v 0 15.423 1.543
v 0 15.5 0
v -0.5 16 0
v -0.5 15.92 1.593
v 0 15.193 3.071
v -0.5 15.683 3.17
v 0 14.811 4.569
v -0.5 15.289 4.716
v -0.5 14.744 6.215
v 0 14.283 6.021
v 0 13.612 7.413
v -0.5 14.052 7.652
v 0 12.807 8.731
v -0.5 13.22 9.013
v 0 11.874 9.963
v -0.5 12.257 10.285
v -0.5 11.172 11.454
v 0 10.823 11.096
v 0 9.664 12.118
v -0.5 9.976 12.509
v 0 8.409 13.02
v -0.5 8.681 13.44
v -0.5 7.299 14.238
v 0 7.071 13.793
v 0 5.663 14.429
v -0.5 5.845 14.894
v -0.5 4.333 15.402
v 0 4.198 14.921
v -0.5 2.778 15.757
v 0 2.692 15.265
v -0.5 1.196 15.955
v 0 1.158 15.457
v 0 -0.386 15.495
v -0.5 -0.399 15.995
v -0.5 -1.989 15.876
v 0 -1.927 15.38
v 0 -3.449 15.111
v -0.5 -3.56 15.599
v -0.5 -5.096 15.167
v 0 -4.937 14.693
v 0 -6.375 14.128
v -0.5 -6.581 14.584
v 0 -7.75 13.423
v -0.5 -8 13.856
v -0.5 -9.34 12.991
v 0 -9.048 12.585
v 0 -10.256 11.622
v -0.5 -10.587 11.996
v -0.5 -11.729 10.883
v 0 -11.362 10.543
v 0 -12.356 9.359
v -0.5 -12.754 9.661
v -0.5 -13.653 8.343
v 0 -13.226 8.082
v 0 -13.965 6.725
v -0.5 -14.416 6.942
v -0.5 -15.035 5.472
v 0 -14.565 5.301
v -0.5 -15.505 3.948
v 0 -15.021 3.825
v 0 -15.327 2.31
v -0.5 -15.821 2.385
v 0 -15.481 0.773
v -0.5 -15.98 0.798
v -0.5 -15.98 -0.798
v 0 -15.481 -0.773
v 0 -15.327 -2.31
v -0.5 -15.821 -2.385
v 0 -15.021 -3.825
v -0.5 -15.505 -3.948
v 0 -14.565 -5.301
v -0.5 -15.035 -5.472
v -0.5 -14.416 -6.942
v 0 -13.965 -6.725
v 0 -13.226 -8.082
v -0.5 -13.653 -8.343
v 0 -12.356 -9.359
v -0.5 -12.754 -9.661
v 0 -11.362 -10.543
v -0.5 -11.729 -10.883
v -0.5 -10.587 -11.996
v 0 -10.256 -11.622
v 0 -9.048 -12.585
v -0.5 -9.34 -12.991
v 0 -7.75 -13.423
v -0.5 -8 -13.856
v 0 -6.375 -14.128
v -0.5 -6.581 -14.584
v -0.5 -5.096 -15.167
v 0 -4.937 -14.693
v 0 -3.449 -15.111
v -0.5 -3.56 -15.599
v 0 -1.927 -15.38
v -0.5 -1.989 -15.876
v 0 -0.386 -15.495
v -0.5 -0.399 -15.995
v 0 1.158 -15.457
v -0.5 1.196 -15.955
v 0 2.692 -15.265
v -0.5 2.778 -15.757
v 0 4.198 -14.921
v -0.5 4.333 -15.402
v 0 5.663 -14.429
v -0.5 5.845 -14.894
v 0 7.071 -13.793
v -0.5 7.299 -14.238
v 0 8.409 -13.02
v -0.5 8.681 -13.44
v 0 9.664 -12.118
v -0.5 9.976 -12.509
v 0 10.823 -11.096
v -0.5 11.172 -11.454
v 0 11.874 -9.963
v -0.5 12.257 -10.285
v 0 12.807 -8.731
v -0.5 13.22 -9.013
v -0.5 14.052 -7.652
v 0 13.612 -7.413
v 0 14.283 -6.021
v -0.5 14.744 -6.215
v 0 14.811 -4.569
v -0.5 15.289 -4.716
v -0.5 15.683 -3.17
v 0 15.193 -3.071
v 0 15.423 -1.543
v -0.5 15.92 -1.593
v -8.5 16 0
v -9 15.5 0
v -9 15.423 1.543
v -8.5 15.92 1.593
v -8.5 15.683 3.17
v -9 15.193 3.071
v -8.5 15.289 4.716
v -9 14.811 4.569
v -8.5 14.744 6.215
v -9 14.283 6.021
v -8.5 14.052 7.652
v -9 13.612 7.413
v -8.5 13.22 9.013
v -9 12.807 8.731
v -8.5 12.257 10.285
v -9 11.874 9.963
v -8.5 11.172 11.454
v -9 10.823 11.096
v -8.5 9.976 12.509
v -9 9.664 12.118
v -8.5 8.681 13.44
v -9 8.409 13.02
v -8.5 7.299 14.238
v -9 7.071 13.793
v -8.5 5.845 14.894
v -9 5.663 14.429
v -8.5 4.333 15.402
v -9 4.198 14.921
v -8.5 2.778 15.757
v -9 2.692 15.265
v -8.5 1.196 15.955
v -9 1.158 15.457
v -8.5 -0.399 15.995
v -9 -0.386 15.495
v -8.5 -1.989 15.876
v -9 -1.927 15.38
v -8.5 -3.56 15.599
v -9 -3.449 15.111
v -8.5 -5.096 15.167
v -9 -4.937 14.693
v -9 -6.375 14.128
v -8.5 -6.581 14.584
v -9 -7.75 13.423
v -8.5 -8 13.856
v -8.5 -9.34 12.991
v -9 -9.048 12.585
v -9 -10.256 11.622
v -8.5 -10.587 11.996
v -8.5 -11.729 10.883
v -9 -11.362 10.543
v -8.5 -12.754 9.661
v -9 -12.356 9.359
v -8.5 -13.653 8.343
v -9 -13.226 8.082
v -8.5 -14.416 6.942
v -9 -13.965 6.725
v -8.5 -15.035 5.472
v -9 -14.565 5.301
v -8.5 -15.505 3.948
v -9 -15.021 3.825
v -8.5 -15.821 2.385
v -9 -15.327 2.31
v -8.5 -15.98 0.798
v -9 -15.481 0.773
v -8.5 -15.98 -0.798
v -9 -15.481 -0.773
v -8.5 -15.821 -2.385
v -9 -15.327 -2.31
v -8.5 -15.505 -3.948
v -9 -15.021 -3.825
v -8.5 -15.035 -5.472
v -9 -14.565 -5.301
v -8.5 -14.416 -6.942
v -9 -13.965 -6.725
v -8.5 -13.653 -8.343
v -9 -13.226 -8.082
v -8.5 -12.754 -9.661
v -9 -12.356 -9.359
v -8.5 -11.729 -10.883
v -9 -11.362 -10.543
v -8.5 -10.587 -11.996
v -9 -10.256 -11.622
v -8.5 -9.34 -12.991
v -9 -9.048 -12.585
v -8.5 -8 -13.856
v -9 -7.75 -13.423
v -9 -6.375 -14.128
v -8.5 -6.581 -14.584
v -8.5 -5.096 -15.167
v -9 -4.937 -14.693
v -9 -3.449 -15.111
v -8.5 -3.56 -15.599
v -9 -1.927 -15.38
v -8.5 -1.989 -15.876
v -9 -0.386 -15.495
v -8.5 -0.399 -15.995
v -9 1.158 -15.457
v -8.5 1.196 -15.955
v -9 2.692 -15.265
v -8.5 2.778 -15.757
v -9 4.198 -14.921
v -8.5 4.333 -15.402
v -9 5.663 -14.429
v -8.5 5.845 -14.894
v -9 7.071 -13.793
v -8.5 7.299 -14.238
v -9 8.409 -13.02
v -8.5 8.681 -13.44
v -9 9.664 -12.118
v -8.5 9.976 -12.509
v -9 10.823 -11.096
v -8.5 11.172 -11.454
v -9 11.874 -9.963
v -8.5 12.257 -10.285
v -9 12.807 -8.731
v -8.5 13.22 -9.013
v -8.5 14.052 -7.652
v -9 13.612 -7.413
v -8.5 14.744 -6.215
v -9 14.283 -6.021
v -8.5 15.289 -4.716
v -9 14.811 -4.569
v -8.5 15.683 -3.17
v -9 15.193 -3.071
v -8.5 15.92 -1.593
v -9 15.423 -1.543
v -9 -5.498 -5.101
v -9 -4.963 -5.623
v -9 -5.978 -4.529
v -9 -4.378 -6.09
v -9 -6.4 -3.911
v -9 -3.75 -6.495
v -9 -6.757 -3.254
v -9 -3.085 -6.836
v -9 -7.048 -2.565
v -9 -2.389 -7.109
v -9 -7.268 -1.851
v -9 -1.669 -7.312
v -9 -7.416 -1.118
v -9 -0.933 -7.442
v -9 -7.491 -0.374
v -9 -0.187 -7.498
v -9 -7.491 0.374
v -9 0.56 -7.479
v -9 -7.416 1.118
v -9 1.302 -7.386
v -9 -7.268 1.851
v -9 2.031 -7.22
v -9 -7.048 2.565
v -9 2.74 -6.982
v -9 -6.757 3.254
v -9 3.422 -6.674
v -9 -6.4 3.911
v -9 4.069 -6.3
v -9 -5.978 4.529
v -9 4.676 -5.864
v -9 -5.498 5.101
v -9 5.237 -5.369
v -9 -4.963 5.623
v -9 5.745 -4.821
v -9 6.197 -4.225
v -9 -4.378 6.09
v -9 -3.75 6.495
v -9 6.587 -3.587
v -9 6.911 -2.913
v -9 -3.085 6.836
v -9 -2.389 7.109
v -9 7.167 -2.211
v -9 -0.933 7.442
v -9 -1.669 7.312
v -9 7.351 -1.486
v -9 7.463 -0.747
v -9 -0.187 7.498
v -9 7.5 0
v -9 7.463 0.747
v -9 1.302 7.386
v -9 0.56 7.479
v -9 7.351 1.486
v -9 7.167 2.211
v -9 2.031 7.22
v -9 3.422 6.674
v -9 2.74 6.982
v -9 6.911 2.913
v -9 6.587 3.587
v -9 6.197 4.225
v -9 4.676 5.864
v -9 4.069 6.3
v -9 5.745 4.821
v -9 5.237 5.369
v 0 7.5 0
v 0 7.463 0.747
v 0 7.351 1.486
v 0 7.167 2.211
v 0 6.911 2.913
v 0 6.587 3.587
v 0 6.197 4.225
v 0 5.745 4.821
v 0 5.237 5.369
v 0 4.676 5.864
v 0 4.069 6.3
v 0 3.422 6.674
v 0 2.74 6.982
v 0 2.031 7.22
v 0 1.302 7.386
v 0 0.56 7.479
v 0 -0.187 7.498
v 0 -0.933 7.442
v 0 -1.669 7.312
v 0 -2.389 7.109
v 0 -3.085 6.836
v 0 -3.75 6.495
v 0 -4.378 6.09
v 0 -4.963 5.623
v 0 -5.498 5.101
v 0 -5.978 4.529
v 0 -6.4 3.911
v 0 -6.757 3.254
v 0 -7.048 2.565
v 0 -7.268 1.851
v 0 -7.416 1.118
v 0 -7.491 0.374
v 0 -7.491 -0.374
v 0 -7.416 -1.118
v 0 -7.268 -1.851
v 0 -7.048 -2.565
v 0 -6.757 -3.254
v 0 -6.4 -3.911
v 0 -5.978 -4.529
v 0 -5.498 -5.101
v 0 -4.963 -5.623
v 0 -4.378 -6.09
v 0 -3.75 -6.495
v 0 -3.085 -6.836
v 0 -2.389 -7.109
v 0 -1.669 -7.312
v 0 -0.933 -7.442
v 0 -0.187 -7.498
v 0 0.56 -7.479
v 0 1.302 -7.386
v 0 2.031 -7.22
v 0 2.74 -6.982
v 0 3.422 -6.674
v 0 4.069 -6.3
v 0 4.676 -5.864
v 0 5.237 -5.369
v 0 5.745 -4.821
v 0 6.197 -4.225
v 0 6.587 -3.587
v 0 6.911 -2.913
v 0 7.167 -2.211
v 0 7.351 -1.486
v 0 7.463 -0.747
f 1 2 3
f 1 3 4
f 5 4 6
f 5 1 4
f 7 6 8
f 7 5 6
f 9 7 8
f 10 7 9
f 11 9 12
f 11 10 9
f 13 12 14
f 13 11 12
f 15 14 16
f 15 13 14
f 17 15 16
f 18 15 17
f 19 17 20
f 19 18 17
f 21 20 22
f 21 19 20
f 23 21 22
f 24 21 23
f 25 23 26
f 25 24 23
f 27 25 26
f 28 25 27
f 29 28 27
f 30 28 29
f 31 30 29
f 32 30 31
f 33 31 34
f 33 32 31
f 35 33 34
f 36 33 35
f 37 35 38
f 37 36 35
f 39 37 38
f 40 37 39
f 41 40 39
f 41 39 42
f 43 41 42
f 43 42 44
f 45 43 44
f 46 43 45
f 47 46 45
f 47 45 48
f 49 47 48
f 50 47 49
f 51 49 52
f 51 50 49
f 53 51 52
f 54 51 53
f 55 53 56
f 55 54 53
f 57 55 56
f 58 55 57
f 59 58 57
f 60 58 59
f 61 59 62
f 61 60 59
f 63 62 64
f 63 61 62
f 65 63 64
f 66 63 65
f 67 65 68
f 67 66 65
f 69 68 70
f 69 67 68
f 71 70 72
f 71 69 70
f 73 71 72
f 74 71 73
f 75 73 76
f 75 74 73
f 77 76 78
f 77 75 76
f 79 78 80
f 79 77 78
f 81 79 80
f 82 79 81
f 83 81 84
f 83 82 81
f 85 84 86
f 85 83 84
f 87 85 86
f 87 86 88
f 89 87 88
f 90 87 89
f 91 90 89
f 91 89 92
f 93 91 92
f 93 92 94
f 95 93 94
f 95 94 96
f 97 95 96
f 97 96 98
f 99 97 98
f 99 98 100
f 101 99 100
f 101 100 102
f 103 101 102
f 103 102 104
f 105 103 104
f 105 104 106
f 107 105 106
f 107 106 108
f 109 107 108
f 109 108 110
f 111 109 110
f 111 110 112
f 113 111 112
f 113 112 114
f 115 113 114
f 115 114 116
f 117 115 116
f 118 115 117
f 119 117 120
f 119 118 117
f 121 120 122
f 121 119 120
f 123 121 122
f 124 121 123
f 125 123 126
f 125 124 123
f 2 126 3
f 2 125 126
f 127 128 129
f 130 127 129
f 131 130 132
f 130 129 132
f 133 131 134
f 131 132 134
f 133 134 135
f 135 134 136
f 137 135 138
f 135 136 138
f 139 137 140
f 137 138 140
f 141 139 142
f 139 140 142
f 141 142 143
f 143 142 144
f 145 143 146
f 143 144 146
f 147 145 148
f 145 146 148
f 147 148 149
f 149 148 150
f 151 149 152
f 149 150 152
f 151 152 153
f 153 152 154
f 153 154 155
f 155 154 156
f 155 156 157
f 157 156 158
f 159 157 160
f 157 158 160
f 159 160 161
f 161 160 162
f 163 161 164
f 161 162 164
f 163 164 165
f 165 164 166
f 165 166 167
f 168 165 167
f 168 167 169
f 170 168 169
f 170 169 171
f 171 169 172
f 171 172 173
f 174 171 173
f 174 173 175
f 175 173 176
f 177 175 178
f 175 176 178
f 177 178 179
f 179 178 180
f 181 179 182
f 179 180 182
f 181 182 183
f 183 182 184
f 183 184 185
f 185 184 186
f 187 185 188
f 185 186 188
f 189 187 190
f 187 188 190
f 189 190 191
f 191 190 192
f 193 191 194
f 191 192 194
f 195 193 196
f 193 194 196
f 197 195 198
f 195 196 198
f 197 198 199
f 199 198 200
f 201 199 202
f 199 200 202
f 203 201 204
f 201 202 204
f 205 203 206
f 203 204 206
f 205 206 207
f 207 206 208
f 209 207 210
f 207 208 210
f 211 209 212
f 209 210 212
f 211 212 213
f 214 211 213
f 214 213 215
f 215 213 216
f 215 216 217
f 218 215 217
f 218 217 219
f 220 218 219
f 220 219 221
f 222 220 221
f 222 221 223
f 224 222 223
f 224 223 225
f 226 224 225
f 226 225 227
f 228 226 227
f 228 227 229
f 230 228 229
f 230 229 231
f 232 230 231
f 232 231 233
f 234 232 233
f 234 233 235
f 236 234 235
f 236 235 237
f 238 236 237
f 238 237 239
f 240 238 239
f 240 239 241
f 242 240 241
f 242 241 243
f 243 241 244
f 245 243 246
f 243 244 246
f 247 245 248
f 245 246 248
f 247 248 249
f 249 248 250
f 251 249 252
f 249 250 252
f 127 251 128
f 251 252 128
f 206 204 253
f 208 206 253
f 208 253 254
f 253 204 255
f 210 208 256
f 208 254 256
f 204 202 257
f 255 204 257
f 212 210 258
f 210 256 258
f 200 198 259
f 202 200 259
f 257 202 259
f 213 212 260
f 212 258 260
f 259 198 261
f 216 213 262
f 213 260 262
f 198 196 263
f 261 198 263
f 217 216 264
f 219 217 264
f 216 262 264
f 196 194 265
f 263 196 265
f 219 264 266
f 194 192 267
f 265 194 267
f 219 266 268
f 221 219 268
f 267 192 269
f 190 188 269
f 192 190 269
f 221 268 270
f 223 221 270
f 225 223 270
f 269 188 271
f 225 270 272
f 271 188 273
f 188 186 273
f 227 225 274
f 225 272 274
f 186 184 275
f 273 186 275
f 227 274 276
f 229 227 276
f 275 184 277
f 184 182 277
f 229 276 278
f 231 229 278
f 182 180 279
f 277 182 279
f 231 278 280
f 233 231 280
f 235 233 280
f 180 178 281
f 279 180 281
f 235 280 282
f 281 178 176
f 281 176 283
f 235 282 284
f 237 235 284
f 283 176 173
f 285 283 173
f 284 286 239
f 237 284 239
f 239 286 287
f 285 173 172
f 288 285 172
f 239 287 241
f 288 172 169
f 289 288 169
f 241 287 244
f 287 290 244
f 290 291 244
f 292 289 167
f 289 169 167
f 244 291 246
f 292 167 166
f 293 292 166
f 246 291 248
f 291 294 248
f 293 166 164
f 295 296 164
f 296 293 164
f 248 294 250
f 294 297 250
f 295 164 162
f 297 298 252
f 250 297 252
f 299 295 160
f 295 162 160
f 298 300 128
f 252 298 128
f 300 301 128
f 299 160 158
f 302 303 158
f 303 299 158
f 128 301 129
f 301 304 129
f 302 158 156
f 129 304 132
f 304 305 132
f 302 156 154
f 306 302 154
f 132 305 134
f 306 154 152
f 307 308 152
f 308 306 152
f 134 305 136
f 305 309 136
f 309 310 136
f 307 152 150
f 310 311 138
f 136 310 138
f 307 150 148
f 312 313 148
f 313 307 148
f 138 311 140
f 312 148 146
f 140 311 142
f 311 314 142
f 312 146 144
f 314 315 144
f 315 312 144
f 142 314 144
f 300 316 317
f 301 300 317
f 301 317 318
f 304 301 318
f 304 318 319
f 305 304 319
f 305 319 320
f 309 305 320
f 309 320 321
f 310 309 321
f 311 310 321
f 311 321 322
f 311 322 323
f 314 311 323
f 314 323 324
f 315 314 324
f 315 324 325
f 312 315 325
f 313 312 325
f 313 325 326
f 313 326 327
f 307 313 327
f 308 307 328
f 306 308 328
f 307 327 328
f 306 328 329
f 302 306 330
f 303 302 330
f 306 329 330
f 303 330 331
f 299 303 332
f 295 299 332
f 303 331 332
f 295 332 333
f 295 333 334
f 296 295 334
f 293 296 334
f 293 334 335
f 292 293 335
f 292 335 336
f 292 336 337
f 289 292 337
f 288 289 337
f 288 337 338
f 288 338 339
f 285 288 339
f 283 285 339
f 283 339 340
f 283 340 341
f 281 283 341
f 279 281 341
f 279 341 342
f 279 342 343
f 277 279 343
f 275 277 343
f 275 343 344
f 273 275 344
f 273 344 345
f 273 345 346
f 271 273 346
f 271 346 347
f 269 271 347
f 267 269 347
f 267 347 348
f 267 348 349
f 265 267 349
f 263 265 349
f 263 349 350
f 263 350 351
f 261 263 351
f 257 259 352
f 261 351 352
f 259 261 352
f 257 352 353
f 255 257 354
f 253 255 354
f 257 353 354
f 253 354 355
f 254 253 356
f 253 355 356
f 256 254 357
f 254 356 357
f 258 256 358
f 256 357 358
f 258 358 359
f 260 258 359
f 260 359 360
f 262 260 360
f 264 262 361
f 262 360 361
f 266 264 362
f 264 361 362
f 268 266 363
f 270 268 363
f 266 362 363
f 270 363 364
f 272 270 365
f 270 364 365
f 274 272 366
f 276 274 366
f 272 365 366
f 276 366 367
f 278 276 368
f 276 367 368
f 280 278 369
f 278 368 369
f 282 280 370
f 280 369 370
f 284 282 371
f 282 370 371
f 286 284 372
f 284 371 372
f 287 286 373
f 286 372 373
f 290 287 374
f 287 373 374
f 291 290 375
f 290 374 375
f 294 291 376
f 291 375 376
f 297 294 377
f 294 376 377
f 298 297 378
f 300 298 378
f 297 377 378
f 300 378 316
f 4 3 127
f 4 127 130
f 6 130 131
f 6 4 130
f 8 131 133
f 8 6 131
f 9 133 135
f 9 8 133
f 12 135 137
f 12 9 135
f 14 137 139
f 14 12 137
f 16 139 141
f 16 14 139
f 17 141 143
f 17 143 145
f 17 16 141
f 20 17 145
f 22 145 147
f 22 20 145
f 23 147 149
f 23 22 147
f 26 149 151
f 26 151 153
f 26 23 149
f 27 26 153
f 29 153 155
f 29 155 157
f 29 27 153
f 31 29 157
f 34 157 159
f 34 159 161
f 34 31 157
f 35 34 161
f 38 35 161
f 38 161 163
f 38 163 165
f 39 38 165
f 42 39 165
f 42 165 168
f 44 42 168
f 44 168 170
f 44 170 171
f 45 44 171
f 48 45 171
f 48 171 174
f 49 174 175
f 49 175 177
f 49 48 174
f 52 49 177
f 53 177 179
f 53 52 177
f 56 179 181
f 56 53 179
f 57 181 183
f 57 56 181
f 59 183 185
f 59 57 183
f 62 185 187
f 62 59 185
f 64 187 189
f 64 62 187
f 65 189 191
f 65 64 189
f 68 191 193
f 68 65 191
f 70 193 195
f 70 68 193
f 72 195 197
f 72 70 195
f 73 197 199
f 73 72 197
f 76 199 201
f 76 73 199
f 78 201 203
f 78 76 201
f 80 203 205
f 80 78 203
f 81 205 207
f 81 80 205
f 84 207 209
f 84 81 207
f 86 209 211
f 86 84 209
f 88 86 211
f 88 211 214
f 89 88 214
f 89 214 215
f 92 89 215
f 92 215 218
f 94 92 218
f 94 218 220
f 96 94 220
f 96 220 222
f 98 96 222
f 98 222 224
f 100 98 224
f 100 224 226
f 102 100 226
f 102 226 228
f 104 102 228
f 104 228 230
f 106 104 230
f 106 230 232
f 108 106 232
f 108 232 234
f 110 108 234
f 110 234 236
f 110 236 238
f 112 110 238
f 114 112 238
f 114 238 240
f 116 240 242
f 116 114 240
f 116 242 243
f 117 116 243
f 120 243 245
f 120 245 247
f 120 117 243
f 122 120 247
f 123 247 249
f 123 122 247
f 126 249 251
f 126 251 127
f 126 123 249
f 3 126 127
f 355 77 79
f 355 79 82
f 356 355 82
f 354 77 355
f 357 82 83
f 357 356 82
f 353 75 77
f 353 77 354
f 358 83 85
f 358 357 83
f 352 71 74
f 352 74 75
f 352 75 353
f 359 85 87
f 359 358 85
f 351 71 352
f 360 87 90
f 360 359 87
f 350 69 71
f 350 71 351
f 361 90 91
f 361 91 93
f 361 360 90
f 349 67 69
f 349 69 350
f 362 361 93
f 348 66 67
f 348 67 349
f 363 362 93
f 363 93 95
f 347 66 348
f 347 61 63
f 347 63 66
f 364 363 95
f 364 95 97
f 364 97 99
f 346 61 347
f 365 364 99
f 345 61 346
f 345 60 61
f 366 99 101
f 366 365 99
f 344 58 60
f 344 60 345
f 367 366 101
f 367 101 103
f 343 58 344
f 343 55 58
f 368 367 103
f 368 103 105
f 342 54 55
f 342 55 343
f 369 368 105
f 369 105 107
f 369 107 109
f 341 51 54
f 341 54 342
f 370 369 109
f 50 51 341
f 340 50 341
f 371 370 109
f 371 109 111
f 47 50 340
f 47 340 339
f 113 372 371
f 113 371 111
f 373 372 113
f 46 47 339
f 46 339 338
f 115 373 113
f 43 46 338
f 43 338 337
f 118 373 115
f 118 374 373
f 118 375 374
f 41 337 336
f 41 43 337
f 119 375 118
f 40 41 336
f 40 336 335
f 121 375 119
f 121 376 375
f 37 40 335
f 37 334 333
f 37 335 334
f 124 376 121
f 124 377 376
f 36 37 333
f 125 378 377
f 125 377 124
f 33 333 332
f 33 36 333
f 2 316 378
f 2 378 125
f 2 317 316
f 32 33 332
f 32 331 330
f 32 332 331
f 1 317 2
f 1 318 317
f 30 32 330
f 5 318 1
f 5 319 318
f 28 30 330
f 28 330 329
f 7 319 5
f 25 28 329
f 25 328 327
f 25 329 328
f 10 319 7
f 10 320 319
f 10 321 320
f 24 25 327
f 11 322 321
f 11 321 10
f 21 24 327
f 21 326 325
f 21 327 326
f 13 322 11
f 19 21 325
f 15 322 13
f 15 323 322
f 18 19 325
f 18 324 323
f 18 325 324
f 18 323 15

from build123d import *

# Parameters (mm, degrees)
F0_R     = 16
F1_DEPTH = 9
F2_R     = 7.5
F3_DEPTH = 9.001
F4_SIZE  = 0.5


with BuildPart() as f1:
    # F0 (on Right) → F1 (new body)
    with BuildSketch(Plane.YZ):
        Circle(F0_R)
    extrude(amount=-F1_DEPTH)

    # F2 (on face) → F3 (cut, through all)
    with BuildSketch(Plane.YZ):
        Circle(F2_R)
    extrude(amount=-F3_DEPTH, mode=Mode.SUBTRACT)

    # F4
    f4_edges = [f1.edges().sort_by_distance(p)[0] for p in [
        (-4.5, 16, 0),
        (0, -16, 0),
        (-9, -16, 0),
    ]]
    chamfer(f4_edges, length=F4_SIZE)


solid = f1.part
